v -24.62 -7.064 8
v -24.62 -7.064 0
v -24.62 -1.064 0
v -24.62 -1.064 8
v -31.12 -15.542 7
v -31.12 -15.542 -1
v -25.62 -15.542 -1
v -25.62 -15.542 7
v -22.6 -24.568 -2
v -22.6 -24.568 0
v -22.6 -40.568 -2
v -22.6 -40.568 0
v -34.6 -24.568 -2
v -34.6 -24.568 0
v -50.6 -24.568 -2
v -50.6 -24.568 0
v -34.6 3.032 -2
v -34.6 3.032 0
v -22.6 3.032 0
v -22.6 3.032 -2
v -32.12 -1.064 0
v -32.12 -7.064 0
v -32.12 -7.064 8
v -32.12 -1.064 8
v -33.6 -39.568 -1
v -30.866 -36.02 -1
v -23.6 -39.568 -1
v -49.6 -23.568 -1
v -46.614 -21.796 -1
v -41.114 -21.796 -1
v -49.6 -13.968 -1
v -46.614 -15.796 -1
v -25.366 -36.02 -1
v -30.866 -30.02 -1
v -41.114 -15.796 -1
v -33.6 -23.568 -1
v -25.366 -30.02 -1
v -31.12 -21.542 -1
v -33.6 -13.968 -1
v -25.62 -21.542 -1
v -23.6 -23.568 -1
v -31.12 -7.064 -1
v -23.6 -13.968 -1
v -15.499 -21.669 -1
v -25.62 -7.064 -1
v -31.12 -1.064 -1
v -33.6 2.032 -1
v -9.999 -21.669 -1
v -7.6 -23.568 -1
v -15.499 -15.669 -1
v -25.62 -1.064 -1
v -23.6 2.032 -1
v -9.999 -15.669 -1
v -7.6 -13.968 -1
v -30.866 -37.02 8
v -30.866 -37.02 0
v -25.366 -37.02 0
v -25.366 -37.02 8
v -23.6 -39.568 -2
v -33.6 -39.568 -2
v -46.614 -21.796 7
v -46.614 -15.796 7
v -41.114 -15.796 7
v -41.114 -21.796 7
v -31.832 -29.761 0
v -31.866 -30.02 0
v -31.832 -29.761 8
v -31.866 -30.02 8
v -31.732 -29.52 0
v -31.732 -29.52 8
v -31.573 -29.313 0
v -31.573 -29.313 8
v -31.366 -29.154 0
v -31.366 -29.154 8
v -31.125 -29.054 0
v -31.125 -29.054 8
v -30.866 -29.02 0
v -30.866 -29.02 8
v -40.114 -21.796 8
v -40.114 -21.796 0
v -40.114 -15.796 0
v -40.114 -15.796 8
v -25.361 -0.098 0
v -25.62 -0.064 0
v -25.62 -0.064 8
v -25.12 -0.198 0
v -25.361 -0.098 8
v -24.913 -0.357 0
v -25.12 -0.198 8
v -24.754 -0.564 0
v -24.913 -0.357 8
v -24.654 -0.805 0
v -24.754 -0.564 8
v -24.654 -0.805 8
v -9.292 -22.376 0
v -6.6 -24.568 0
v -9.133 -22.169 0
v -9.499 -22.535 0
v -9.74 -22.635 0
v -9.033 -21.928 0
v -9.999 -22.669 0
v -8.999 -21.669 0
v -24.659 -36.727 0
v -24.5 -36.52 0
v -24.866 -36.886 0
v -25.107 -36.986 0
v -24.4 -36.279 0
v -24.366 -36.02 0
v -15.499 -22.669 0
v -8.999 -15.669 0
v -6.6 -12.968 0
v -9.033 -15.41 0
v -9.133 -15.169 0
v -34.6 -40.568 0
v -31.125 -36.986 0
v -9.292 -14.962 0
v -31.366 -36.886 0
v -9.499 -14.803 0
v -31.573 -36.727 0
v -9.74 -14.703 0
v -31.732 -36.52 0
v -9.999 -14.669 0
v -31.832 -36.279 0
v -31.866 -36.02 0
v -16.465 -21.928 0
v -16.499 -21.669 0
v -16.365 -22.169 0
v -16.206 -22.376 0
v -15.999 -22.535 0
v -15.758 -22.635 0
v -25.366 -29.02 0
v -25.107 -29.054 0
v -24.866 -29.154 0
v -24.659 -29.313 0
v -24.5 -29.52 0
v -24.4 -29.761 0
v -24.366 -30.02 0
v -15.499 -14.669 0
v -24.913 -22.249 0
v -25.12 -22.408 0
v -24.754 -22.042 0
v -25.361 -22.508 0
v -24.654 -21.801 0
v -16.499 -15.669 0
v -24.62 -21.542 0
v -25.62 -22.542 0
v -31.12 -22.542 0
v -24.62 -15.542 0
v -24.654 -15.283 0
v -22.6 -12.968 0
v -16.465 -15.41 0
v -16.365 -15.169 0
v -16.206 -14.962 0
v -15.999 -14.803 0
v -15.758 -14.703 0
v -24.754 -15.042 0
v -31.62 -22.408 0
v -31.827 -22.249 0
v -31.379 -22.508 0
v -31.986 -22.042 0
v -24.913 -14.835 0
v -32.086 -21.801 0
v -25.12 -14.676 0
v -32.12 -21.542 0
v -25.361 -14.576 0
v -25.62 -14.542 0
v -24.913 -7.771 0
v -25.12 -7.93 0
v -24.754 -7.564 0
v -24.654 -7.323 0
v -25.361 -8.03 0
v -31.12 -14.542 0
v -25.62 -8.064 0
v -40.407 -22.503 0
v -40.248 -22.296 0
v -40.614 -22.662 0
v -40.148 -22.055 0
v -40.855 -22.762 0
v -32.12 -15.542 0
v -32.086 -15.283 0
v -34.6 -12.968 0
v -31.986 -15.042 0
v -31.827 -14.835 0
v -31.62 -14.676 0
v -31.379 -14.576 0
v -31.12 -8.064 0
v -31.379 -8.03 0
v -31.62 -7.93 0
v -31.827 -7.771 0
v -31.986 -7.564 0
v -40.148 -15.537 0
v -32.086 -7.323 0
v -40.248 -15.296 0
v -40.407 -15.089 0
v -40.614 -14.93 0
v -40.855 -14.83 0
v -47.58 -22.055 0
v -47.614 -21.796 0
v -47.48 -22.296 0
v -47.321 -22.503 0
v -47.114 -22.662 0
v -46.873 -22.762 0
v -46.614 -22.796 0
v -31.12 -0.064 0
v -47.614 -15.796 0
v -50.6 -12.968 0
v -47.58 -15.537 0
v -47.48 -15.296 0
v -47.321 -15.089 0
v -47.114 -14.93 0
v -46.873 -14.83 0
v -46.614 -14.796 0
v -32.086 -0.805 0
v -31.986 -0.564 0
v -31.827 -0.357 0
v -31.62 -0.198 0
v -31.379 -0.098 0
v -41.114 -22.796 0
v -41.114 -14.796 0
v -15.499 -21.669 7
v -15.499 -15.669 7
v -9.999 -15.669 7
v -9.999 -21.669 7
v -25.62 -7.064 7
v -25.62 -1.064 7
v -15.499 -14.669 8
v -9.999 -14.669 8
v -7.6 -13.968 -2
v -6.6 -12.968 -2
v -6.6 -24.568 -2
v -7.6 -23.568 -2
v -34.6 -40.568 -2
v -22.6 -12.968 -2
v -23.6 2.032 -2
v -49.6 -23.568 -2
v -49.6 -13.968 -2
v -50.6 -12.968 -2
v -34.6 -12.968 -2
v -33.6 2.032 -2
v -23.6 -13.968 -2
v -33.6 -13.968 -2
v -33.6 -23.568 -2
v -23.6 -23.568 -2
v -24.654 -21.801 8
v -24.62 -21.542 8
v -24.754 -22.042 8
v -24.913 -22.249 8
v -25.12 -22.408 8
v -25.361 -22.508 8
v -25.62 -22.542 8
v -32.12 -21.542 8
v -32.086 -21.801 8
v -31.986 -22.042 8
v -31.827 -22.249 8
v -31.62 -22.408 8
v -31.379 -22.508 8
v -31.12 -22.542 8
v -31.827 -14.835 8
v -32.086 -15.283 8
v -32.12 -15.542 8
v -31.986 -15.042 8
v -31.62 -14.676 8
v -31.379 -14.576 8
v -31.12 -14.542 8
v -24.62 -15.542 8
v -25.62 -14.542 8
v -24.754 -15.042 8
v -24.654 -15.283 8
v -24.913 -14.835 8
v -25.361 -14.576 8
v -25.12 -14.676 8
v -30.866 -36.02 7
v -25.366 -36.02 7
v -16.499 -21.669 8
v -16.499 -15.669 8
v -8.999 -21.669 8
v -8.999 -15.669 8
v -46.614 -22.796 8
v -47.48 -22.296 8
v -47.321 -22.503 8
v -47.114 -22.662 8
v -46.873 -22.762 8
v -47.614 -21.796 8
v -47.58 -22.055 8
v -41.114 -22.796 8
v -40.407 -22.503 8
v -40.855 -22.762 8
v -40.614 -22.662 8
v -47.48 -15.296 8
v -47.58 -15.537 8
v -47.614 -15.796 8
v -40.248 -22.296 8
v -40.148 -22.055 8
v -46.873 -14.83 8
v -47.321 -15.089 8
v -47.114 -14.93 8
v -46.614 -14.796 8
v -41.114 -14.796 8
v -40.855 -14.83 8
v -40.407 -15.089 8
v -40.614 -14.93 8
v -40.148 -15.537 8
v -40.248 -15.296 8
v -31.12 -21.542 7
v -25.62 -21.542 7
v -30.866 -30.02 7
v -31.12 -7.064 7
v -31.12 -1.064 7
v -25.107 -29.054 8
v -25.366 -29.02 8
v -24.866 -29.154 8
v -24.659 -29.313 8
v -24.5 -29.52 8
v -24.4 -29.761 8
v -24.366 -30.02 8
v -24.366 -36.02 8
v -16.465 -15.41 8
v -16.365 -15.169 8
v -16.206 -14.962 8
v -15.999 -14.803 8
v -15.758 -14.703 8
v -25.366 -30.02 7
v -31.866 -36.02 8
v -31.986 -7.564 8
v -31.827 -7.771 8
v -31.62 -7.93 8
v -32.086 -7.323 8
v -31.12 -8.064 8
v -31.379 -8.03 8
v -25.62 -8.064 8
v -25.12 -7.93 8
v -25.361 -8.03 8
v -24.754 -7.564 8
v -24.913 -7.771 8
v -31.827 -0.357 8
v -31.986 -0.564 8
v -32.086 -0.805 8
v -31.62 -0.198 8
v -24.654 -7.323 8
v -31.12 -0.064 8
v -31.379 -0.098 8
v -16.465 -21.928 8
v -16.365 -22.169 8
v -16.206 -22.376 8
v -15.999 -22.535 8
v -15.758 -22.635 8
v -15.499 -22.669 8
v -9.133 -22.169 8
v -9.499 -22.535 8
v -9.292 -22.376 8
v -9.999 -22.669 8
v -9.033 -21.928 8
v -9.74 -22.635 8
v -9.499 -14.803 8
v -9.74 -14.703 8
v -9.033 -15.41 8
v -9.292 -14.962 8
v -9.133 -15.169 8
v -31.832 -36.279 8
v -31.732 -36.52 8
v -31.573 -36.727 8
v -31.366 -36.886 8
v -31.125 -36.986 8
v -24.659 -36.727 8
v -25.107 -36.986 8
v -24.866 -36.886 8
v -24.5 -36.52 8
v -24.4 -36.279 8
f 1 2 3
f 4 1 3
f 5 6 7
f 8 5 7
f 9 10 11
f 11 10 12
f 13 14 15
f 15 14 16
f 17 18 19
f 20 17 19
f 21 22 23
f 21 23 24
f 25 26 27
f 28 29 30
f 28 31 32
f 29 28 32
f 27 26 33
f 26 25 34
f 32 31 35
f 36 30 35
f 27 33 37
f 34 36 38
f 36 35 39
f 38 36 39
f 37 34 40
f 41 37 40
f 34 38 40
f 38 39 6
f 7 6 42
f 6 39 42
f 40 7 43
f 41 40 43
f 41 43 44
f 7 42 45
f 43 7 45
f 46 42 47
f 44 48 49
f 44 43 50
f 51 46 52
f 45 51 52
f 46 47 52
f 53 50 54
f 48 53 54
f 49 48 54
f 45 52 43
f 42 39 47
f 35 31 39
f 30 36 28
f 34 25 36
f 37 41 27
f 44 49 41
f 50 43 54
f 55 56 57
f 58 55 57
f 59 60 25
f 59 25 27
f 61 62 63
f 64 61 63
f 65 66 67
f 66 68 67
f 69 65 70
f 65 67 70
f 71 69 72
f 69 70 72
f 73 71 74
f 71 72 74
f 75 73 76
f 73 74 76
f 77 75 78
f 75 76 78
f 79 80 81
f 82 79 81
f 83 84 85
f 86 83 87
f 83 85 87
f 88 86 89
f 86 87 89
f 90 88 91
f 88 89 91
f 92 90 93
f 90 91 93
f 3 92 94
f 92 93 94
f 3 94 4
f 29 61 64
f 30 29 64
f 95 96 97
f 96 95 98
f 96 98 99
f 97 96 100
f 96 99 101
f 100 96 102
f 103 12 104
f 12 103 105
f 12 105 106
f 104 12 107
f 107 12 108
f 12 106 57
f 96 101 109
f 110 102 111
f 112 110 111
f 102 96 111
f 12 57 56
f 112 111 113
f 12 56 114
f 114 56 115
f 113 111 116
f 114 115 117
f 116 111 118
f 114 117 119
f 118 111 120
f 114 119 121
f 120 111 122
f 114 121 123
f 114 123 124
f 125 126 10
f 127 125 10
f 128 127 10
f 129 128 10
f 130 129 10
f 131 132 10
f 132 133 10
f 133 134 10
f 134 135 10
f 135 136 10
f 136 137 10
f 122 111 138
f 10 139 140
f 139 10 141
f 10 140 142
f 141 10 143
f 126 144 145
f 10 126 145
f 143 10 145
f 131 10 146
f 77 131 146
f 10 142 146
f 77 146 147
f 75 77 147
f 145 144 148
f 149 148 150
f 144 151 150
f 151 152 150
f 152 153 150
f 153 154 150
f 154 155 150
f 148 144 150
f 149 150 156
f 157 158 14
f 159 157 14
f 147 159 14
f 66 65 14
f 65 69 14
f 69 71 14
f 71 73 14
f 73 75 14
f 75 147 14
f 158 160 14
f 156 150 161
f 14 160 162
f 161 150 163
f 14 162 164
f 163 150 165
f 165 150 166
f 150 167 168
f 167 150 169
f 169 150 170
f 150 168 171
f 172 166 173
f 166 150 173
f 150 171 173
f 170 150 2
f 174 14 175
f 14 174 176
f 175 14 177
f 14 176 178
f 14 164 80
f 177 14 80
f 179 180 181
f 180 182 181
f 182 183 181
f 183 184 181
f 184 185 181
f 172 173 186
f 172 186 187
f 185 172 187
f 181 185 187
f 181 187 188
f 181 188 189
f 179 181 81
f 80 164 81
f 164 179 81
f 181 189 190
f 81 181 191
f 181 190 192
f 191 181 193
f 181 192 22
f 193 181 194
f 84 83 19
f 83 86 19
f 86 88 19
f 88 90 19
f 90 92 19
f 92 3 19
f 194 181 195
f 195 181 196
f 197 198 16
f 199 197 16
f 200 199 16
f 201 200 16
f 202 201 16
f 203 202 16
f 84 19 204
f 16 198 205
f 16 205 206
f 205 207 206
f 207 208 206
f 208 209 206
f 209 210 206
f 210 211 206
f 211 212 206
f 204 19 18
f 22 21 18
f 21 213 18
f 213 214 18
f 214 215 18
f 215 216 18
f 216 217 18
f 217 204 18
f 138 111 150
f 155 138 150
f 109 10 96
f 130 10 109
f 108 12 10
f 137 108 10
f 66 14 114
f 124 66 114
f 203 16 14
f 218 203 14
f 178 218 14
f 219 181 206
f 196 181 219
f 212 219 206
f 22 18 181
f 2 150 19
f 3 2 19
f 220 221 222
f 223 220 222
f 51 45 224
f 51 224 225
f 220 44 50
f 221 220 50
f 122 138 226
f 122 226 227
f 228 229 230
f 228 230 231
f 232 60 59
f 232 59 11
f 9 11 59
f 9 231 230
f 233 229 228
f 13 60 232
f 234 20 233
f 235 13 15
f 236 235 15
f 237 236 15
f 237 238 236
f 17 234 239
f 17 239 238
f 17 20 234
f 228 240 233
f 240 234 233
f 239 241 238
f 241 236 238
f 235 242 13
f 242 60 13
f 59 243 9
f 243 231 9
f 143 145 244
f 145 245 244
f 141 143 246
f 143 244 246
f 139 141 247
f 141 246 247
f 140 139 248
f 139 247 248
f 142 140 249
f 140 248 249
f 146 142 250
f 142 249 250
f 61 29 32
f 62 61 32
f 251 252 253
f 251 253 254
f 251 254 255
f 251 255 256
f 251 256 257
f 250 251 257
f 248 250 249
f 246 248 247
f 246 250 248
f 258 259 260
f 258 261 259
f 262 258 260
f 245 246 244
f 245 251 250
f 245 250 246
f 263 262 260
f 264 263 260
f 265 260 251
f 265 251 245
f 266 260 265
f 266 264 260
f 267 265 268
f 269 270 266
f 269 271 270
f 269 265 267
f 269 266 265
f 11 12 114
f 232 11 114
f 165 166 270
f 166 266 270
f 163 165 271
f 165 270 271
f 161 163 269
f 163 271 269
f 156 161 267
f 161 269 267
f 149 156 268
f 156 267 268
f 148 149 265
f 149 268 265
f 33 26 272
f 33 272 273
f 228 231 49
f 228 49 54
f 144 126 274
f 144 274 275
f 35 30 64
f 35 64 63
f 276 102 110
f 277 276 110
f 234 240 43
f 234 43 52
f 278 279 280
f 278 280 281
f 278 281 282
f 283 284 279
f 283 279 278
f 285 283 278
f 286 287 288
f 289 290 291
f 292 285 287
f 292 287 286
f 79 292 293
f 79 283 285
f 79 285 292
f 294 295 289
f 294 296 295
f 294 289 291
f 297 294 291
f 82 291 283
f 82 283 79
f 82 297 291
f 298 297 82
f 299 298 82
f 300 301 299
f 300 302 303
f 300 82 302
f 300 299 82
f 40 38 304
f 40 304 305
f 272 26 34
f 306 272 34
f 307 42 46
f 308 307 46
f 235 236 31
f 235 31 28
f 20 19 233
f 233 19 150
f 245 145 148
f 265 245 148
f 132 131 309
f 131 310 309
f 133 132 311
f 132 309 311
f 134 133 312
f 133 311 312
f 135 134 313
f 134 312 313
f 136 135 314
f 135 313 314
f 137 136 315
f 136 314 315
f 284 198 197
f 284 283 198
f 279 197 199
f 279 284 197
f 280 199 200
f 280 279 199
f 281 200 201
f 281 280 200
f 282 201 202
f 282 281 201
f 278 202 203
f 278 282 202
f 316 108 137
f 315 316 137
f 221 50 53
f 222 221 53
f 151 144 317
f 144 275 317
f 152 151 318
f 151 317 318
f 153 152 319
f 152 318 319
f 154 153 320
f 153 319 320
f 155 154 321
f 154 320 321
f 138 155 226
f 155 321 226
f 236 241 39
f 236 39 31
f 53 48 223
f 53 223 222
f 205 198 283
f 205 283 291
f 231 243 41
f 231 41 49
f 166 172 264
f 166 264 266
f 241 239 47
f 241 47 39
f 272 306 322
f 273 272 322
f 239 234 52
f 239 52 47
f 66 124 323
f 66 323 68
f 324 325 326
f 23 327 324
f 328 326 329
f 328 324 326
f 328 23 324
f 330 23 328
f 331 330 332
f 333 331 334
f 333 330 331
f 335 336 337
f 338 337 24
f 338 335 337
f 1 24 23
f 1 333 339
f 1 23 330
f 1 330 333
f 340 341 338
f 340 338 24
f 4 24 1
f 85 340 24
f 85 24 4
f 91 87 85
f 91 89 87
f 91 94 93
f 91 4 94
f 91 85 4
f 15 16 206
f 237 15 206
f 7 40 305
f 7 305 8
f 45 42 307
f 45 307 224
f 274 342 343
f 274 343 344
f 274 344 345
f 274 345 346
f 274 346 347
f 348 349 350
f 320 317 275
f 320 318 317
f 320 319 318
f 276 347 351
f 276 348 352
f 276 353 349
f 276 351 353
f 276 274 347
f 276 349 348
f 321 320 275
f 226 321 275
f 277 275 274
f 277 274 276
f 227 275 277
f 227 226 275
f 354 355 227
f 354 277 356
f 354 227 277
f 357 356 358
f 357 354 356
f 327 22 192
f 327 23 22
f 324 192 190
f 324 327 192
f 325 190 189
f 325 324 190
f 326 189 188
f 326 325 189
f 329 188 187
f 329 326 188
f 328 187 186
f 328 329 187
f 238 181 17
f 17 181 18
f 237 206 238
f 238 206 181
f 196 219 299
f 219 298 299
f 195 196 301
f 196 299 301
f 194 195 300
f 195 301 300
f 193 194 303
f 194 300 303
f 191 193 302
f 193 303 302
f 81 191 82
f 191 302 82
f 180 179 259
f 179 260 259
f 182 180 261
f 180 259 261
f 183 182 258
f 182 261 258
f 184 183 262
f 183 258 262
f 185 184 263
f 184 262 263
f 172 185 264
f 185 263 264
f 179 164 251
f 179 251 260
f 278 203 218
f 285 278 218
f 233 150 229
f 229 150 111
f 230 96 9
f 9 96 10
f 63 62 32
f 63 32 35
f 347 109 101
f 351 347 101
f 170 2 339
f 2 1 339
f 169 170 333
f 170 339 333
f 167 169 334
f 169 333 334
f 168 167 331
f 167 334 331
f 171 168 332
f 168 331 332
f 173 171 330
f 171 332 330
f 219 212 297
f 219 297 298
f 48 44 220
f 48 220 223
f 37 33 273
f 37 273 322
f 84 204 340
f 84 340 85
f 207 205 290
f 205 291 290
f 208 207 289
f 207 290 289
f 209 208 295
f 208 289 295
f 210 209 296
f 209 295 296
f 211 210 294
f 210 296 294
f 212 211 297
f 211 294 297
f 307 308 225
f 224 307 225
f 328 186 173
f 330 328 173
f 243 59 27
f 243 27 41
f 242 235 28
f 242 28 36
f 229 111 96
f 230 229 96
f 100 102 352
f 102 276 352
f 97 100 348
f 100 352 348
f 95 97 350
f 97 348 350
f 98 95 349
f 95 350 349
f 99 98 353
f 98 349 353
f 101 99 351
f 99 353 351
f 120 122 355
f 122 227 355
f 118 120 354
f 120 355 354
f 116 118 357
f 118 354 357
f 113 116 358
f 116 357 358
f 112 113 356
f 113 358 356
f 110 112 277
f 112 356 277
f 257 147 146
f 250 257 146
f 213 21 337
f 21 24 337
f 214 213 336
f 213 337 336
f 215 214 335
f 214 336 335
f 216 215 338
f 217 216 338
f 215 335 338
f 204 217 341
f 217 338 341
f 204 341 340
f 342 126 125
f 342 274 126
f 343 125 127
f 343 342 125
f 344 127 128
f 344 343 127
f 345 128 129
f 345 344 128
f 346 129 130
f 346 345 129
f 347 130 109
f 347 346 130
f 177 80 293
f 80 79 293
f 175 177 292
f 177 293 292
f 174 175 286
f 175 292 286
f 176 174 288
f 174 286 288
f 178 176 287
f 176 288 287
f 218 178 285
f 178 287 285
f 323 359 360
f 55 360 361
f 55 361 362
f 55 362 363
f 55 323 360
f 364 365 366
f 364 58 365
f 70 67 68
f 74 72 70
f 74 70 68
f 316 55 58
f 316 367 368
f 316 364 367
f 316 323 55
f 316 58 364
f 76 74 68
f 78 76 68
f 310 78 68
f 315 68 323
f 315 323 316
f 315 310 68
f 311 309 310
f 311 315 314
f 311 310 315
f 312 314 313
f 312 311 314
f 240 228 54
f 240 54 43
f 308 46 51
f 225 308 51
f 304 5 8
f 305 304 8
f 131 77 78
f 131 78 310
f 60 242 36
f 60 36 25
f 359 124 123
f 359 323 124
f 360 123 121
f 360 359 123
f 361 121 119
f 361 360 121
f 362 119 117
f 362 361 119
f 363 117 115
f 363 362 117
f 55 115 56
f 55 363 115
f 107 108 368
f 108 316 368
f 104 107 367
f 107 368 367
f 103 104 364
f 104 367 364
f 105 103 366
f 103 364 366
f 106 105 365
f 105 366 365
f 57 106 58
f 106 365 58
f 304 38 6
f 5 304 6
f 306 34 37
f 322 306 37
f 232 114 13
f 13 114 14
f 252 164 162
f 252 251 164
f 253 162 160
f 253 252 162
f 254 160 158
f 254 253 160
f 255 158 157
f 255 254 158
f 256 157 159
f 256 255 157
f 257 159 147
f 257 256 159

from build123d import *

# Parameters (mm, degrees)
SKETCH1_W             = 7.5000007
SKETCH1_H             = 8
BOSS_EXTRUDE1_DEPTH   = 8
BOSS_EXTRUDE1_2_DEPTH = 8
SKETCH1_W_2           = 7.500000349
SKETCH1_H_2           = 7.999999673
BOSS_EXTRUDE1_3_DEPTH = 8
SKETCH1_W_3           = 7.500000699
SKETCH1_H_3           = 7.999999344
BOSS_EXTRUDE1_4_DEPTH = 8
SKETCH1_W_4           = 7.50000035
SKETCH1_H_4           = 7.999999672
BOSS_EXTRUDE1_5_DEPTH = 8
BOSS_EXTRUDE2_DEPTH   = 2
FILLET1_R             = 1
FILLET2_R             = 1
FILLET3_R             = 1
FILLET4_R             = 1
FILLET5_R             = 1
SHELL8_START          = -2
SHELL8_OUTLINE_W      = 5.5000007
SHELL8_OUTLINE_H      = 6
SHELL8_OUTLINE_W_2    = 5.500000349
SHELL8_OUTLINE_H_2    = 5.999999673
SHELL8_OUTLINE_W_3    = 5.500000699
SHELL8_OUTLINE_H_3    = 5.999999344
SHELL8_OUTLINE_W_4    = 5.50000035
SHELL8_OUTLINE_H_4    = 5.999999672
SHELL8_DEPTH          = 9
SHELL8_2_OUTLINE_W    = 5.50000035
SHELL8_2_OUTLINE_H    = 5.999999672
SHELL8_2_OUTLINE_W_2  = 5.500000699
SHELL8_2_OUTLINE_H_2  = 5.999999344
SHELL8_2_OUTLINE_W_3  = 5.5000007
SHELL8_2_OUTLINE_H_3  = 6
SHELL8_2_OUTLINE_W_4  = 5.500000349
SHELL8_2_OUTLINE_H_4  = 5.999999673
SHELL8_2_DEPTH        = 1


# Read off the part's stored shape, not the designer's step: Shell8
with BuildPart() as part:
    # Sketch1 → Boss-Extrude1 (new body)
    with BuildSketch(Plane.XY):
        with Locations((-28.369785759, -4.064003029)):
            Rectangle(SKETCH1_W, SKETCH1_H)
    extrude(amount=BOSS_EXTRUDE1_DEPTH)



with BuildPart() as body_2:
    # Sketch1 → Boss-Extrude1 2 (new body)
    with BuildSketch(Plane.XY):
        with Locations((-28.369785759, -18.542000511)):
            Rectangle(SKETCH1_W, SKETCH1_H)
    extrude(amount=BOSS_EXTRUDE1_2_DEPTH)


with BuildPart() as body_3:
    # Sketch1 → Boss-Extrude1 3 (new body)
    with BuildSketch(Plane.XY):
        with Locations((-12.748787377, -18.668999085)):
            Rectangle(SKETCH1_W_2, SKETCH1_H_2)
    extrude(amount=BOSS_EXTRUDE1_3_DEPTH)


with BuildPart() as body_4:
    # Sketch1 → Boss-Extrude1 4 (new body)
    with BuildSketch(Plane.XY):
        with Locations((-28.115787957, -33.019997009)):
            Rectangle(SKETCH1_W_3, SKETCH1_H_3)
    extrude(amount=BOSS_EXTRUDE1_4_DEPTH)


with BuildPart() as body_5:
    # Sketch1 → Boss-Extrude1 5 (new body)
    with BuildSketch(Plane.XY):
        with Locations((-43.86378524, -18.795997986)):
            Rectangle(SKETCH1_W_4, SKETCH1_H_4)
    extrude(amount=BOSS_EXTRUDE1_5_DEPTH)


with BuildPart() as part_1:
    add(part.part)

    add(body_2.part)  # Boss-Extrude2 merges body 2

    add(body_3.part)  # Boss-Extrude2 merges body 3

    add(body_4.part)  # Boss-Extrude2 merges body 4

    add(body_5.part)  # Boss-Extrude2 merges body 5
    # Sketch3 → Boss-Extrude2 (add)
    with BuildSketch(Plane(origin=(0, 0, 0), x_dir=(-1, 0, 0), z_dir=(0, 0, -1))):
        Polygon((22.599963615, -12.968328574), (6.599963615, -12.968328574), (6.599963615, -24.568328574), (22.599963615, -24.568328574), (22.599963615, -40.568328574), (34.599963615, -40.568328574), (34.599963615, -24.568328574), (50.599963615, -24.568328574), (50.599963615, -12.968328574), (34.599963615, -12.968328574), (34.599963615, 3.031671426), (22.599963615, 3.031671426), align=None)
    extrude(amount=BOSS_EXTRUDE2_DEPTH)

    # Fillet1
    fillet1_edges = [part_1.edges().sort_by_distance(p)[0] for p in [
        (-31.865788306, -29.019997337, 4),
        (-31.865788306, -37.019996681, 4),
        (-24.365787607, -37.019996681, 4),
        (-24.365787607, -29.019997337, 4),
    ]]
    fillet(fillet1_edges, radius=FILLET1_R)

    # Fillet2
    fillet2_edges = [part_1.edges().sort_by_distance(p)[0] for p in [
        (-32.119786109, -14.542000511, 4),
        (-32.119786109, -22.542000511, 4),
        (-24.619785409, -22.542000511, 4),
        (-24.619785409, -14.542000511, 4),
    ]]
    fillet(fillet2_edges, radius=FILLET2_R)

    # Fillet3
    fillet3_edges = [part_1.edges().sort_by_distance(p)[0] for p in [
        (-47.613785415, -14.79599815, 4),
        (-47.613785415, -22.795997822, 4),
        (-40.113785065, -22.795997822, 4),
        (-40.113785065, -14.79599815, 4),
    ]]
    fillet(fillet3_edges, radius=FILLET3_R)

    # Fillet4
    fillet4_edges = [part_1.edges().sort_by_distance(p)[0] for p in [
        (-32.119786109, -0.064003029, 4),
        (-24.619785409, -0.064003029, 4),
        (-24.619785409, -8.064003029, 4),
        (-32.119786109, -8.064003029, 4),
    ]]
    fillet(fillet4_edges, radius=FILLET4_R)

    # Fillet5
    fillet5_edges = [part_1.edges().sort_by_distance(p)[0] for p in [
        (-16.498787551, -14.668999248, 4),
        (-16.498787551, -22.668998921, 4),
        (-8.998787202, -22.668998921, 4),
        (-8.998787202, -14.668999248, 4),
    ]]
    fillet(fillet5_edges, radius=FILLET5_R)

    # Shell8 outline → Shell8 (cut)
    with BuildSketch(Plane.XY.offset(SHELL8_START)):
        with Locations((-28.369785759, -4.064003029)):
            Rectangle(SHELL8_OUTLINE_W, SHELL8_OUTLINE_H)
        with Locations((-28.369785759, -18.542000511)):
            Rectangle(SHELL8_OUTLINE_W, SHELL8_OUTLINE_H)
        with Locations((-12.748787377, -18.668999085)):
            Rectangle(SHELL8_OUTLINE_W_2, SHELL8_OUTLINE_H_2)
        with Locations((-28.115787957, -33.019997009)):
            Rectangle(SHELL8_OUTLINE_W_3, SHELL8_OUTLINE_H_3)
        with Locations((-43.86378524, -18.795997986)):
            Rectangle(SHELL8_OUTLINE_W_4, SHELL8_OUTLINE_H_4)
    extrude(amount=SHELL8_DEPTH, mode=Mode.SUBTRACT)

    # Shell8 2 outline → Shell8 2 (cut)
    with BuildSketch(Plane.XY.offset(SHELL8_START)):
        Polygon((-23.599963615, -13.968328574), (-23.599963615, 2.031671426), (-33.599963615, 2.031671426), (-33.599963615, -13.968328574), (-49.599963615, -13.968328574), (-49.599963615, -23.568328574), (-33.599963615, -23.568328574), (-33.599963615, -39.568328574), (-23.599963615, -39.568328574), (-23.599963615, -23.568328574), (-7.599963615, -23.568328574), (-7.599963615, -13.968328574), align=None)
        with Locations((-43.86378524, -18.795997986)):
            Rectangle(SHELL8_2_OUTLINE_W, SHELL8_2_OUTLINE_H, mode=Mode.SUBTRACT)
        with Locations((-28.115787957, -33.019997009)):
            Rectangle(SHELL8_2_OUTLINE_W_2, SHELL8_2_OUTLINE_H_2, mode=Mode.SUBTRACT)
        with Locations((-28.369785759, -18.542000511)):
            Rectangle(SHELL8_2_OUTLINE_W_3, SHELL8_2_OUTLINE_H_3, mode=Mode.SUBTRACT)
        with Locations((-12.748787377, -18.668999085)):
            Rectangle(SHELL8_2_OUTLINE_W_4, SHELL8_2_OUTLINE_H_4, mode=Mode.SUBTRACT)
        with Locations((-28.369785759, -4.064003029)):
            Rectangle(SHELL8_2_OUTLINE_W_3, SHELL8_2_OUTLINE_H_3, mode=Mode.SUBTRACT)
    extrude(amount=SHELL8_2_DEPTH, mode=Mode.SUBTRACT)


solid = part_1.part
